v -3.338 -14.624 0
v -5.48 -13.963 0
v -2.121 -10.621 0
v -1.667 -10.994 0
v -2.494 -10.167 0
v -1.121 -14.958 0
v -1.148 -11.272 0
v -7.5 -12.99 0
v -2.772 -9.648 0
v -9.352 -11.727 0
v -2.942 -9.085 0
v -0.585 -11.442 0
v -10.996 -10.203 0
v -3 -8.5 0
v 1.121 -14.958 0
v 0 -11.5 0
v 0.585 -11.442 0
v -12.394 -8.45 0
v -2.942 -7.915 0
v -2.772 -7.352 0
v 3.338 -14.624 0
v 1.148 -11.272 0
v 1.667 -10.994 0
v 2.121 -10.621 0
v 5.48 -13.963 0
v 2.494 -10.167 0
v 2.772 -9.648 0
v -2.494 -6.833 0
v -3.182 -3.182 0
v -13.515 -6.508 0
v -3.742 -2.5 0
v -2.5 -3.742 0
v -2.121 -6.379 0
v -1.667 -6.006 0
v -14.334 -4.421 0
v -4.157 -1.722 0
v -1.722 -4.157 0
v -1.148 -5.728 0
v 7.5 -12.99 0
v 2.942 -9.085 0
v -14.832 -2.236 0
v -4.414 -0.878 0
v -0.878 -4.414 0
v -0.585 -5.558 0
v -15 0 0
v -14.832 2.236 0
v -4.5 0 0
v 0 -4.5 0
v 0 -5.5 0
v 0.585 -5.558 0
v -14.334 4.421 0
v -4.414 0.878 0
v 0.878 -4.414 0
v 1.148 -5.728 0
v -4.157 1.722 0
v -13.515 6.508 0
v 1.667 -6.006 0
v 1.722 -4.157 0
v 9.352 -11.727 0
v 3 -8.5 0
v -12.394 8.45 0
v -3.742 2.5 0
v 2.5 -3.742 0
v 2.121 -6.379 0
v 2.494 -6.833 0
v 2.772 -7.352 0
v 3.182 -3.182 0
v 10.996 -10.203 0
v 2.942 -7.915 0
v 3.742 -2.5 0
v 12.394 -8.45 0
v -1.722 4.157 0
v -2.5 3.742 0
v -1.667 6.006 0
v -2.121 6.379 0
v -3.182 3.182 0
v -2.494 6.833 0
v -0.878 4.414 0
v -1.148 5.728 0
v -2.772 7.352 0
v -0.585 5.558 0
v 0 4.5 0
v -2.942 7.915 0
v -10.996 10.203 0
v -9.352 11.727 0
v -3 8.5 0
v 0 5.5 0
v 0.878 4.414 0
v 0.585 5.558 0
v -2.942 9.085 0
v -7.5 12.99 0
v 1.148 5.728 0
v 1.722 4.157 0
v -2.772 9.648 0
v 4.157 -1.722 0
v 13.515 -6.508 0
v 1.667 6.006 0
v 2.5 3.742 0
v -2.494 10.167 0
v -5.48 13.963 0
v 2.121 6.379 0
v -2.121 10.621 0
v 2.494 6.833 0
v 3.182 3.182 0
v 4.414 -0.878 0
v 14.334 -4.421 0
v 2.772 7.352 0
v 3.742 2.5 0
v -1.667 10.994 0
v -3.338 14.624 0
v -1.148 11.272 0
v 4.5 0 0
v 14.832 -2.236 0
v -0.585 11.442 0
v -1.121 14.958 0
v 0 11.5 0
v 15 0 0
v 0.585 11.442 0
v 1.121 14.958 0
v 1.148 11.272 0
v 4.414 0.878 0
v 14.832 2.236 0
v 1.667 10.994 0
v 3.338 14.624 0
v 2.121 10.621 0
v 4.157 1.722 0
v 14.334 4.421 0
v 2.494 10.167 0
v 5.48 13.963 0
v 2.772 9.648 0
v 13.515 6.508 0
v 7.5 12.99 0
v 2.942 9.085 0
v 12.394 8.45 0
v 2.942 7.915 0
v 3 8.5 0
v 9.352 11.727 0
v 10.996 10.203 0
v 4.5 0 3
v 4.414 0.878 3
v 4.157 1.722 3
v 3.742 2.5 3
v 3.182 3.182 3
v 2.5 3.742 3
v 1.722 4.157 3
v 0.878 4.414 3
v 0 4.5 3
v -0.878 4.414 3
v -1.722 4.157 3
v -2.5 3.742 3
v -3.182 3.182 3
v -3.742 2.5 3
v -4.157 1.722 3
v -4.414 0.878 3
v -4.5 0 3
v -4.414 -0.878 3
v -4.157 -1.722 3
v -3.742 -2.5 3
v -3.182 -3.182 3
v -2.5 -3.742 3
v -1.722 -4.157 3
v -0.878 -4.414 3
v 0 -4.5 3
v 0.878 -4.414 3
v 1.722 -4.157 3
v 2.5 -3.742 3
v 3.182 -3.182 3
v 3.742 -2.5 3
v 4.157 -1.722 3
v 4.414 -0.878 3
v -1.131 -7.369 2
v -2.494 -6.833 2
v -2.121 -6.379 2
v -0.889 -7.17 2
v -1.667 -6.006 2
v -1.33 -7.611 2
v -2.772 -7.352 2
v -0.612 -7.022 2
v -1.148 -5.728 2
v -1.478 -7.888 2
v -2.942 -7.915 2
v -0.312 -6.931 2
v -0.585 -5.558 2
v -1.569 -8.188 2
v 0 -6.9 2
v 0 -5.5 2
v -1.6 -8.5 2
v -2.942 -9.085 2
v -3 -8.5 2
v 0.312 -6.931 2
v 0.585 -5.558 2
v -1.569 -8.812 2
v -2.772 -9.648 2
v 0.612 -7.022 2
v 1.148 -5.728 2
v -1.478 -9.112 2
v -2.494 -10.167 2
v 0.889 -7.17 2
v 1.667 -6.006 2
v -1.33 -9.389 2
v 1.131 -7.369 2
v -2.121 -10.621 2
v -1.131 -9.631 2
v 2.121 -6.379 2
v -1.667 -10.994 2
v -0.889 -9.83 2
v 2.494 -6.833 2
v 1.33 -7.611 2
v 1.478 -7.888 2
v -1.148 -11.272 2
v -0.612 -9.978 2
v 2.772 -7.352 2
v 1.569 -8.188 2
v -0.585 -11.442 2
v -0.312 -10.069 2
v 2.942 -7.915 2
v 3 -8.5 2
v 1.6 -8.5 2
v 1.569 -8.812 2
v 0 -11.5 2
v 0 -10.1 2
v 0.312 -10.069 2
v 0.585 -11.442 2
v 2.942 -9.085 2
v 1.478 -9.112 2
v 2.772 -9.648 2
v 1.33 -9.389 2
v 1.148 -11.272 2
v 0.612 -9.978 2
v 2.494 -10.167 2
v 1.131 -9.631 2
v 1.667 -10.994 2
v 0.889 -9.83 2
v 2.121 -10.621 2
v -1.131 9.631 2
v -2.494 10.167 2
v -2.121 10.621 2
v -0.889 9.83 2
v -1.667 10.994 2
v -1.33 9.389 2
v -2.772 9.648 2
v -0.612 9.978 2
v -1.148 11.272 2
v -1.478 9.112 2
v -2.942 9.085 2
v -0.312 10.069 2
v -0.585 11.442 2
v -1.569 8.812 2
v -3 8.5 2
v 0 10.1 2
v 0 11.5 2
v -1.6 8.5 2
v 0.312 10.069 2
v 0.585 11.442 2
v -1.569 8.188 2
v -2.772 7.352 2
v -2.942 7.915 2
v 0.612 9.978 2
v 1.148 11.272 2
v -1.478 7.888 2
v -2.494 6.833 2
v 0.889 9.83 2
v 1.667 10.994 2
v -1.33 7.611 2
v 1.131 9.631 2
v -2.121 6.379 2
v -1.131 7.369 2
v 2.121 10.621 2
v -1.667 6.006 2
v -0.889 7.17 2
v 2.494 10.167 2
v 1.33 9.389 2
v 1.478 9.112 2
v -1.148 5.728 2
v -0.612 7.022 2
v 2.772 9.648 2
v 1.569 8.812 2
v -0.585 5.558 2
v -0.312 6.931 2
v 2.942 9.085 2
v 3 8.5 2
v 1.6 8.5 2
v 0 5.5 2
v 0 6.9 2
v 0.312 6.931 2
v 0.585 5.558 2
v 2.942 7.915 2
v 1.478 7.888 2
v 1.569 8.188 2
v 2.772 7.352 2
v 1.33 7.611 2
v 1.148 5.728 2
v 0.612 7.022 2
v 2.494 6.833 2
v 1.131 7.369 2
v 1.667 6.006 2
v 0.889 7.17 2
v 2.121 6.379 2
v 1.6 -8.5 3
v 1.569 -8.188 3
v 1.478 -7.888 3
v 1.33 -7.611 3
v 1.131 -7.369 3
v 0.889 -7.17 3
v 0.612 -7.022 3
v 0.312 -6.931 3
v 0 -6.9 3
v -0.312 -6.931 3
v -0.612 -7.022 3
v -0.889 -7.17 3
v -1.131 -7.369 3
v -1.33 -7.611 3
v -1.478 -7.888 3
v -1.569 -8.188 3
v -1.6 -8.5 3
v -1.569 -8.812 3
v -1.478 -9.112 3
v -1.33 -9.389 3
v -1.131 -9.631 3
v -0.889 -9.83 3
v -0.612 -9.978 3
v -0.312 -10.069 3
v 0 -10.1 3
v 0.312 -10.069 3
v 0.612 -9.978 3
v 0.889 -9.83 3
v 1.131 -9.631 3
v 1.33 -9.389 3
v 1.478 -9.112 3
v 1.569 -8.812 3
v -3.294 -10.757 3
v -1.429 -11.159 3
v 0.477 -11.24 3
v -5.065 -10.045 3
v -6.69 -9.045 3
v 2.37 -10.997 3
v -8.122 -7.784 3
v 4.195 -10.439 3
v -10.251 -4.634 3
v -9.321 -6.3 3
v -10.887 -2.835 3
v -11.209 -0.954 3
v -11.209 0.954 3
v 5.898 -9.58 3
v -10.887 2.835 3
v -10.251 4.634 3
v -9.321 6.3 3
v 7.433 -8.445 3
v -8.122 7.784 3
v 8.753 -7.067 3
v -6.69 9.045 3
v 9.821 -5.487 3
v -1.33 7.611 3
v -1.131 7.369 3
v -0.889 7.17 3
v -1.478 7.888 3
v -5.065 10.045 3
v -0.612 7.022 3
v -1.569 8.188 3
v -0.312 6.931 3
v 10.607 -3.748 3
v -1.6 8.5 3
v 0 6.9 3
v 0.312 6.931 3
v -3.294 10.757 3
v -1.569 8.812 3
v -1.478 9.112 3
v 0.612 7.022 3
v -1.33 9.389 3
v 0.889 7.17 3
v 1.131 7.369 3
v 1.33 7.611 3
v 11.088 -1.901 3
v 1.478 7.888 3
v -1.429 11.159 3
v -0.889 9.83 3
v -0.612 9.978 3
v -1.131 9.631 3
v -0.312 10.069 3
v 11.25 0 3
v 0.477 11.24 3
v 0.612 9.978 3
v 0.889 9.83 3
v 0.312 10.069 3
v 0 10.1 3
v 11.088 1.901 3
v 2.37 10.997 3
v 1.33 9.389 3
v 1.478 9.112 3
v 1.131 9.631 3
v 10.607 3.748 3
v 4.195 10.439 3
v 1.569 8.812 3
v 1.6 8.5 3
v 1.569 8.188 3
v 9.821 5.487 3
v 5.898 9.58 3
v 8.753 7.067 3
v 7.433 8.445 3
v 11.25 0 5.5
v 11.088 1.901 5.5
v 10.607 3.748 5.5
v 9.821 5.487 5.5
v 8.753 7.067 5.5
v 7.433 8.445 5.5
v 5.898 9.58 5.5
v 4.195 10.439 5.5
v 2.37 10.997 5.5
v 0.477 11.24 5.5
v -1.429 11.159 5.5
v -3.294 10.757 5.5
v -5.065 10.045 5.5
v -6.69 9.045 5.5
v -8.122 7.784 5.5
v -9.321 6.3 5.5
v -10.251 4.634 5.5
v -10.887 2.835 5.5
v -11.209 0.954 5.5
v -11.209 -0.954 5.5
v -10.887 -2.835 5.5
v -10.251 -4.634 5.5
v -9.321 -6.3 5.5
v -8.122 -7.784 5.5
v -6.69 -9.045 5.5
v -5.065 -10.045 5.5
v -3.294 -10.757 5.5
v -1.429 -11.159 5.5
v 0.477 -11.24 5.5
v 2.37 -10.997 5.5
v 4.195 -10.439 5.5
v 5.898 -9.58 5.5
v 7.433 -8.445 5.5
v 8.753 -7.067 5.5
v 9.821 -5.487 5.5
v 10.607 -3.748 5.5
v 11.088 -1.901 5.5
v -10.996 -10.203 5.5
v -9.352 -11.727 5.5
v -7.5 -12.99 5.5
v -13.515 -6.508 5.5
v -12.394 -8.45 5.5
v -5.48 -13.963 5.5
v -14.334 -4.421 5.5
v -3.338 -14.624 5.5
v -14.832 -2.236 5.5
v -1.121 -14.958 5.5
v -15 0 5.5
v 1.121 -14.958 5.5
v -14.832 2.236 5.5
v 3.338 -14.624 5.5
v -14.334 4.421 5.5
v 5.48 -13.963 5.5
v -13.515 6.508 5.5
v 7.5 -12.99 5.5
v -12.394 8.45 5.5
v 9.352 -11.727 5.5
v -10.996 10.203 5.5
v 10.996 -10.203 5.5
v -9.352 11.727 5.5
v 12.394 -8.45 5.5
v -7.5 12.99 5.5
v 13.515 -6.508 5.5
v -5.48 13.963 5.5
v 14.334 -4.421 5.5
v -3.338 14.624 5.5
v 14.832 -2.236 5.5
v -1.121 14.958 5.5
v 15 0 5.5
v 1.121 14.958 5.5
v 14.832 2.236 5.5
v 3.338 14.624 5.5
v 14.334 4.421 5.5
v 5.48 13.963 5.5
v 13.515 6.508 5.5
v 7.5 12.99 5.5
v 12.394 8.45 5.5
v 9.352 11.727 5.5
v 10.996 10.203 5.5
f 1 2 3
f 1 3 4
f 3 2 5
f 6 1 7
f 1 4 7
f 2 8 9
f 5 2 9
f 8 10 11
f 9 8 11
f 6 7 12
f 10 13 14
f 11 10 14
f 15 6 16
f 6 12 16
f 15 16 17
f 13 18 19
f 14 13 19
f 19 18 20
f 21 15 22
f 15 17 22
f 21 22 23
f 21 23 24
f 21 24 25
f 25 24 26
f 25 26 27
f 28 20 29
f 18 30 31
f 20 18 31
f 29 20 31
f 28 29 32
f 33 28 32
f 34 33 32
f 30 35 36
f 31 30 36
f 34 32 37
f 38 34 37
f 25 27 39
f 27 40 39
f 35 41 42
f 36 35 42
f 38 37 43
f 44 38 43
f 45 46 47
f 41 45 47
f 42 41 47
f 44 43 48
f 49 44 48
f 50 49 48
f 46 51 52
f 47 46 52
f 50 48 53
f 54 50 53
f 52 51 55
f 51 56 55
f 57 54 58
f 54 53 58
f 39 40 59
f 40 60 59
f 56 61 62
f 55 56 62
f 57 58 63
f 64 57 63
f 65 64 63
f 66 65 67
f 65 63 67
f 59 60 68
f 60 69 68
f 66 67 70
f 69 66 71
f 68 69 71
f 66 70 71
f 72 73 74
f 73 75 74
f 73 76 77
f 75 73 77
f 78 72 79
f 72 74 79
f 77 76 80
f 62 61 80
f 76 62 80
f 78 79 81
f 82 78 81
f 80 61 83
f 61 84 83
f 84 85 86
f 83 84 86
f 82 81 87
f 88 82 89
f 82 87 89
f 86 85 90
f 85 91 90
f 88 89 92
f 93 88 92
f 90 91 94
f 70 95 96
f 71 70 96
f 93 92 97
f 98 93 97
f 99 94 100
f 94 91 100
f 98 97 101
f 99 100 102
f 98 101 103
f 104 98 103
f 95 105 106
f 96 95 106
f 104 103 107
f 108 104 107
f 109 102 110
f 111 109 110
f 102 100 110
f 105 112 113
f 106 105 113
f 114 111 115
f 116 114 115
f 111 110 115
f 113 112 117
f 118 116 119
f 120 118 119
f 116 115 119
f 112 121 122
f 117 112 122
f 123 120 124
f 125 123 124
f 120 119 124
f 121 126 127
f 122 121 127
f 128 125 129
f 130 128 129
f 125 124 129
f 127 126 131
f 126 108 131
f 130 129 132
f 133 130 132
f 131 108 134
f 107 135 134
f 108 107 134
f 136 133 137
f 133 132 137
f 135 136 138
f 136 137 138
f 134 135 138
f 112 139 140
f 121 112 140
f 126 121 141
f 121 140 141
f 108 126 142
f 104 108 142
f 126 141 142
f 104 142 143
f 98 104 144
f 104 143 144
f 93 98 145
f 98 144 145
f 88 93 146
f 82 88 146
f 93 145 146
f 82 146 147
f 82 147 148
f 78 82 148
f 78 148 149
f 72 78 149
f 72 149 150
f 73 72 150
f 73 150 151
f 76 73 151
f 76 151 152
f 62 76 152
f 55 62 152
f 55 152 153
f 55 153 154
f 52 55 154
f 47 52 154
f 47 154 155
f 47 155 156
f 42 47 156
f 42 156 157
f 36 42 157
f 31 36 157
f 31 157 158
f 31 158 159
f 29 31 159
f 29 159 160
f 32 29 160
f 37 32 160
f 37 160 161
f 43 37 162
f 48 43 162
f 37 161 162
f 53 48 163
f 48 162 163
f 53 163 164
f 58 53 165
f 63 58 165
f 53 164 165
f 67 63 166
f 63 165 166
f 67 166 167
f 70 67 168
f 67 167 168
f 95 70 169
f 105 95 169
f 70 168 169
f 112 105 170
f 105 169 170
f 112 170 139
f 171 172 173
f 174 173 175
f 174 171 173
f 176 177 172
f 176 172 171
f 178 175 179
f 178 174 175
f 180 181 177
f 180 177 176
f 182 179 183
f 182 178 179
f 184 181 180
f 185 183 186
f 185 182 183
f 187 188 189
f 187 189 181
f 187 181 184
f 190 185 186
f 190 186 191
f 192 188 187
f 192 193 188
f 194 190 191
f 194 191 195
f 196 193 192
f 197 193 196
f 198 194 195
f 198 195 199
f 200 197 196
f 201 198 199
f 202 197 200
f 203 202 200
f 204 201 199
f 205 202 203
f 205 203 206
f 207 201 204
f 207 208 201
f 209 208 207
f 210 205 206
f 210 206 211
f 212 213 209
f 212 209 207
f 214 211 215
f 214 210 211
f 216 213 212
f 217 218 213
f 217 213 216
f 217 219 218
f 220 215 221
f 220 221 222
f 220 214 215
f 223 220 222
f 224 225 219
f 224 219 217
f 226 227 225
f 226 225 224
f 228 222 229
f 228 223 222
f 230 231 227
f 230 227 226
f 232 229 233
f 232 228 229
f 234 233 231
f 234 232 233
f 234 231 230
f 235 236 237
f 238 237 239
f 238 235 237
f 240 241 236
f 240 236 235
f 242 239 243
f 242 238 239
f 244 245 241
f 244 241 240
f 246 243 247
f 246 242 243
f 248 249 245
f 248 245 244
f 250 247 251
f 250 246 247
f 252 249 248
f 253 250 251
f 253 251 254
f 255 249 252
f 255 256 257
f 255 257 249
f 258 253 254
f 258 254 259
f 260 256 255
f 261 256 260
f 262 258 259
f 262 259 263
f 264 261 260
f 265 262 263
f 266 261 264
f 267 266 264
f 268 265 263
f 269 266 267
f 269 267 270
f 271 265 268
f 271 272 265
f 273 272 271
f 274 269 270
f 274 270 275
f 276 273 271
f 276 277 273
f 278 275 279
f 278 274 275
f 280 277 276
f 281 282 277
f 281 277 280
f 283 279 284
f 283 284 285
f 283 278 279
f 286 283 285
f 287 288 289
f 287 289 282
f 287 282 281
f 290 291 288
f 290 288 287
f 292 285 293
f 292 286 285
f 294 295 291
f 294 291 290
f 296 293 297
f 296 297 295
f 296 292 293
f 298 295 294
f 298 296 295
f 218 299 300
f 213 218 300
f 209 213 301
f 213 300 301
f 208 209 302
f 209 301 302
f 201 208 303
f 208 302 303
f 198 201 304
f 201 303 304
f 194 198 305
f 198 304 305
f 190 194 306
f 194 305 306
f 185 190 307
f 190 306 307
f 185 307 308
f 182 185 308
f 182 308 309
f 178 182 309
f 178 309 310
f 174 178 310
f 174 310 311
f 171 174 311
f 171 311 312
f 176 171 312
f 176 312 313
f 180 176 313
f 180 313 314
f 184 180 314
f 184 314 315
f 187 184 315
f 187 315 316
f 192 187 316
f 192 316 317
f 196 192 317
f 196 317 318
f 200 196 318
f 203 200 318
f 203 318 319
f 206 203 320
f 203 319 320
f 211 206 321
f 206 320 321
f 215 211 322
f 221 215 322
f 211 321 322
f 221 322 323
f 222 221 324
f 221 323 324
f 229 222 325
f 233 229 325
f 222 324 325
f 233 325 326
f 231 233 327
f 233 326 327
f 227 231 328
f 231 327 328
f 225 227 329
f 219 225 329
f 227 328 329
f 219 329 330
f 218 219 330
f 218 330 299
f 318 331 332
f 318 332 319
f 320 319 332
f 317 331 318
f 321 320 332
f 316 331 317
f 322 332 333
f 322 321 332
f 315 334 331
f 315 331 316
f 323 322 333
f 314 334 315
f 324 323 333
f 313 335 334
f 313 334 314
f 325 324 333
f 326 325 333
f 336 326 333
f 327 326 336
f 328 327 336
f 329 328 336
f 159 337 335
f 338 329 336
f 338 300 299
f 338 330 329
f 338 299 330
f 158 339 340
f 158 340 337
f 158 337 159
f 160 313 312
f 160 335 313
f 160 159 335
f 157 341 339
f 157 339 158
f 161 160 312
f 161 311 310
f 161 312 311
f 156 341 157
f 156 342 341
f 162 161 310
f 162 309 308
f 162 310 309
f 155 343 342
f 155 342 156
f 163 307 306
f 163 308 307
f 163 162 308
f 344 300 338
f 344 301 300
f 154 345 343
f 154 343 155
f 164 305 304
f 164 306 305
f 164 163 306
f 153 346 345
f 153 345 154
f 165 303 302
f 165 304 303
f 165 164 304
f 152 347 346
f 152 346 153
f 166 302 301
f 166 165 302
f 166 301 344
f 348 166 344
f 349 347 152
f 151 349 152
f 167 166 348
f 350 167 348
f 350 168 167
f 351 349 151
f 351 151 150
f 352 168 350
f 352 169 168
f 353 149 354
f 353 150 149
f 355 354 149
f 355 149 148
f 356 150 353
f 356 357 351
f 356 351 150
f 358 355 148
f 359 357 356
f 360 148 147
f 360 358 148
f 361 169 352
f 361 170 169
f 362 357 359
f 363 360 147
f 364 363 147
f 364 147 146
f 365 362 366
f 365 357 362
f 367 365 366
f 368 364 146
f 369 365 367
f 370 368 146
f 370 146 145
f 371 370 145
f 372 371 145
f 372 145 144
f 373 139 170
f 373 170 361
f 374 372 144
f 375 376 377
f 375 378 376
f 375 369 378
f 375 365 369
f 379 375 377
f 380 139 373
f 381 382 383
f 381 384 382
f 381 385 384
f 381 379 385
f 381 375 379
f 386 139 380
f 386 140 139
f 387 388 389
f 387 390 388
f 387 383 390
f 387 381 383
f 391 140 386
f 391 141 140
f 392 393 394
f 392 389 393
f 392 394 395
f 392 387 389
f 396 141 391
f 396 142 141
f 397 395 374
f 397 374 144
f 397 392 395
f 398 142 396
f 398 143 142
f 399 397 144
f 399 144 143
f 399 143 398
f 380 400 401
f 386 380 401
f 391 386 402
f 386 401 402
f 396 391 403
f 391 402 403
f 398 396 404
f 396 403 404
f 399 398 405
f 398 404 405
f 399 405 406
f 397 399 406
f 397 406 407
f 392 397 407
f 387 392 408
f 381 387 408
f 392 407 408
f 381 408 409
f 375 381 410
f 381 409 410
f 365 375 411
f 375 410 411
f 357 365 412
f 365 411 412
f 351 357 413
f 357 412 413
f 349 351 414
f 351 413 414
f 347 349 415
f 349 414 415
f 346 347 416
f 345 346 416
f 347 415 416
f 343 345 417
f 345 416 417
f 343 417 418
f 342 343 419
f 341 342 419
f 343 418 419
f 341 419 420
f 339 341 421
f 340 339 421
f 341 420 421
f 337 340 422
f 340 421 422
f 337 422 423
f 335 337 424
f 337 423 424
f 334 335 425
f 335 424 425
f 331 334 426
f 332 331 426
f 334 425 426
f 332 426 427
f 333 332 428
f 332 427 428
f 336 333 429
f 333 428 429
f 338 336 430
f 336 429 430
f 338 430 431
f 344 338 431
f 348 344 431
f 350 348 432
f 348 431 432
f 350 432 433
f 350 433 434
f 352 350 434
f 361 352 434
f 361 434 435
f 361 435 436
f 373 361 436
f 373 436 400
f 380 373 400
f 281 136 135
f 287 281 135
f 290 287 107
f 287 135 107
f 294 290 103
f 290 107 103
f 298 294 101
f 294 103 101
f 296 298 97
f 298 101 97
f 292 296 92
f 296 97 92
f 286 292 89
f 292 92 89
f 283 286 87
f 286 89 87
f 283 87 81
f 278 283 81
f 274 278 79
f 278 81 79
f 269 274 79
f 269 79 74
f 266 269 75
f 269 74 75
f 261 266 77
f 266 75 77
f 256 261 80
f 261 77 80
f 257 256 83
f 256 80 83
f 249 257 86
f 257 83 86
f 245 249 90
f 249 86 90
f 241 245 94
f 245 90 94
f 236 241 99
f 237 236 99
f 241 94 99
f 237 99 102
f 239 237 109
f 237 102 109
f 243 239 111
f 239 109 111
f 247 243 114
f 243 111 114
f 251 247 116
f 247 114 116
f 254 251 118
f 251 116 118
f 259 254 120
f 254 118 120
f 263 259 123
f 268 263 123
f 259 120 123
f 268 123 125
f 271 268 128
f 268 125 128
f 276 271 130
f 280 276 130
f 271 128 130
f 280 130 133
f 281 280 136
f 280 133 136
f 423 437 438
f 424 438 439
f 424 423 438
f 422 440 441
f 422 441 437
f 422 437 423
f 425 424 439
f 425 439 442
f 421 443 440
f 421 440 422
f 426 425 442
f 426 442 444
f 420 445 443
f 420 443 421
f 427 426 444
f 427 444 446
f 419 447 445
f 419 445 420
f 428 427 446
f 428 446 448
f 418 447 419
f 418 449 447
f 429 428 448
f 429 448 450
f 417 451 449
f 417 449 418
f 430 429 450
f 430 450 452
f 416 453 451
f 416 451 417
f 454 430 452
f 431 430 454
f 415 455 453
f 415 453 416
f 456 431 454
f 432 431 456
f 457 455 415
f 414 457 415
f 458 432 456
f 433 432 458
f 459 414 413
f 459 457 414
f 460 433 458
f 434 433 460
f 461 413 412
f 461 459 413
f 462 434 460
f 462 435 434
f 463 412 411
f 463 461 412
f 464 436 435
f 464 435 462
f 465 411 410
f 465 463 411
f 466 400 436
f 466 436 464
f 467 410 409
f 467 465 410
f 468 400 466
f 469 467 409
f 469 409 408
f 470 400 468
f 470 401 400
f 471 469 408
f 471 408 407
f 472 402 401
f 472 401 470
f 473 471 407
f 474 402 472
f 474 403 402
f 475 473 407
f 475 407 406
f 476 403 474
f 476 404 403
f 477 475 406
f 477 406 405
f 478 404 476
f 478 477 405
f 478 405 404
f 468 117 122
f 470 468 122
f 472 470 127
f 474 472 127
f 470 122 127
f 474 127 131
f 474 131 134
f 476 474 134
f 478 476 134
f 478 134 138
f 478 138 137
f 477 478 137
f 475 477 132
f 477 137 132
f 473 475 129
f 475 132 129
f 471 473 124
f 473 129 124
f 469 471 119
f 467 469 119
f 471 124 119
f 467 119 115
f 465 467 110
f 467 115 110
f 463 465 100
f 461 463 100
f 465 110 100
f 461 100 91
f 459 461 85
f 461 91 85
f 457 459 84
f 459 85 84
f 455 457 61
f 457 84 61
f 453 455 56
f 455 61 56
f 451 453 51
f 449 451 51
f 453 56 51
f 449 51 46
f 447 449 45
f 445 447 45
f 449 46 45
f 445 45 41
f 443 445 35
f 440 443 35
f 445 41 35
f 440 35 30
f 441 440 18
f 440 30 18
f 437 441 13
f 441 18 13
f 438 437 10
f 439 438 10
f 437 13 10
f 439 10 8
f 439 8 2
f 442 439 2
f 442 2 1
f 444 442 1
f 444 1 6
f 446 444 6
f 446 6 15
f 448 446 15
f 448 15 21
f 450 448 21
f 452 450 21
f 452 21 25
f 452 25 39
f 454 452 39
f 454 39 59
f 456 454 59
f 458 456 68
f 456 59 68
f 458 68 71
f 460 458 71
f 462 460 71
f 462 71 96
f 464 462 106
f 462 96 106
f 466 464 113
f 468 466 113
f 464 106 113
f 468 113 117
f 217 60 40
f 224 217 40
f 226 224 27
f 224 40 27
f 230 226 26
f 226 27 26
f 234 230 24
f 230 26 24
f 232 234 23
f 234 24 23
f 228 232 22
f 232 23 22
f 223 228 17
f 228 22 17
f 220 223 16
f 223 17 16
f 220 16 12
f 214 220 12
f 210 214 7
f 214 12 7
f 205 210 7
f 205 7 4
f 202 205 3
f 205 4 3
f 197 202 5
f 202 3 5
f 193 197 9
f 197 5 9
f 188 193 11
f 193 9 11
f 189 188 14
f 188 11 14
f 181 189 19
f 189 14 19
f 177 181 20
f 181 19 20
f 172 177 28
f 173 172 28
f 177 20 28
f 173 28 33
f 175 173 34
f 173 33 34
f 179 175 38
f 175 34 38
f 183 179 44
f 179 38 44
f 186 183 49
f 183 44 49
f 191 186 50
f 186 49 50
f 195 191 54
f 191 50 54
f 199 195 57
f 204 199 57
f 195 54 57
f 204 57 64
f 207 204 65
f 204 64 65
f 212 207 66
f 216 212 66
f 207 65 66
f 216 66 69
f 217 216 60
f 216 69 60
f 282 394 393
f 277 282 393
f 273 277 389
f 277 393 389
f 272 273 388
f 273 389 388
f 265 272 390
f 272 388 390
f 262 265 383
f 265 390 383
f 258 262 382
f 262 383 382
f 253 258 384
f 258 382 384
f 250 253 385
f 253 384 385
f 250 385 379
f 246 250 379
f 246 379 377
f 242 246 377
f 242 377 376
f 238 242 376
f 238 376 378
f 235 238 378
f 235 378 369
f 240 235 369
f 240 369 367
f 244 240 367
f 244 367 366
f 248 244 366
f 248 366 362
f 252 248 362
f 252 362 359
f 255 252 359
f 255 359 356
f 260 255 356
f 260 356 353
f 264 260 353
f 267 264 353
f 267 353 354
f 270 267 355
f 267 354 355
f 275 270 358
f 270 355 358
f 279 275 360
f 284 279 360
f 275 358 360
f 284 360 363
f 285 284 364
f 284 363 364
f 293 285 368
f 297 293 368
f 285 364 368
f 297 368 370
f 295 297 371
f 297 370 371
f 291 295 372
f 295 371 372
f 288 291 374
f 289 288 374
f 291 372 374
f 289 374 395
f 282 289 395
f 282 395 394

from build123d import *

# Parameters (mm, degrees)
SKETCH_R        = 15
PAD_DEPTH       = 5.5
SKETCH001_R     = 4.5
SKETCH001_R_2   = 1.6
POCKET_DEPTH    = 5.501
SKETCH002_R     = 11.25
POCKET001_DEPTH = 2.5
SKETCH003_R     = 3
POCKET002_DEPTH = 2


with BuildPart() as part:
    # Sketch → Pad (new body)
    with BuildSketch(Plane.XY):
        Circle(SKETCH_R)
    extrude(amount=PAD_DEPTH)

    # Sketch001 (on Face3 of Pad) → Pocket (cut, through all)
    with BuildSketch(Plane.XY.offset(5.5)):
        Circle(SKETCH001_R)
        with Locations((0, 8.5)):
            Circle(SKETCH001_R_2)
        with Locations((0, -8.5)):
            Circle(SKETCH001_R_2)
    extrude(amount=-POCKET_DEPTH, mode=Mode.SUBTRACT)

    # Sketch002 (on Face3 of Pocket) → Pocket001 (cut)
    with BuildSketch(Plane.XY.offset(5.5)):
        Circle(SKETCH002_R)
    extrude(amount=-POCKET001_DEPTH, mode=Mode.SUBTRACT)

    # Sketch003 (on Face2 of Pocket001) → Pocket002 (cut)
    with BuildSketch(Plane(origin=(0, 0, 0), x_dir=(1, 0, 0), z_dir=(0, 0, -1))):
        with Locations((0, 8.5)):
            Circle(SKETCH003_R)
        with Locations((0, -8.5)):
            Circle(SKETCH003_R)
    extrude(amount=-POCKET002_DEPTH, mode=Mode.SUBTRACT)


solid = part.part
